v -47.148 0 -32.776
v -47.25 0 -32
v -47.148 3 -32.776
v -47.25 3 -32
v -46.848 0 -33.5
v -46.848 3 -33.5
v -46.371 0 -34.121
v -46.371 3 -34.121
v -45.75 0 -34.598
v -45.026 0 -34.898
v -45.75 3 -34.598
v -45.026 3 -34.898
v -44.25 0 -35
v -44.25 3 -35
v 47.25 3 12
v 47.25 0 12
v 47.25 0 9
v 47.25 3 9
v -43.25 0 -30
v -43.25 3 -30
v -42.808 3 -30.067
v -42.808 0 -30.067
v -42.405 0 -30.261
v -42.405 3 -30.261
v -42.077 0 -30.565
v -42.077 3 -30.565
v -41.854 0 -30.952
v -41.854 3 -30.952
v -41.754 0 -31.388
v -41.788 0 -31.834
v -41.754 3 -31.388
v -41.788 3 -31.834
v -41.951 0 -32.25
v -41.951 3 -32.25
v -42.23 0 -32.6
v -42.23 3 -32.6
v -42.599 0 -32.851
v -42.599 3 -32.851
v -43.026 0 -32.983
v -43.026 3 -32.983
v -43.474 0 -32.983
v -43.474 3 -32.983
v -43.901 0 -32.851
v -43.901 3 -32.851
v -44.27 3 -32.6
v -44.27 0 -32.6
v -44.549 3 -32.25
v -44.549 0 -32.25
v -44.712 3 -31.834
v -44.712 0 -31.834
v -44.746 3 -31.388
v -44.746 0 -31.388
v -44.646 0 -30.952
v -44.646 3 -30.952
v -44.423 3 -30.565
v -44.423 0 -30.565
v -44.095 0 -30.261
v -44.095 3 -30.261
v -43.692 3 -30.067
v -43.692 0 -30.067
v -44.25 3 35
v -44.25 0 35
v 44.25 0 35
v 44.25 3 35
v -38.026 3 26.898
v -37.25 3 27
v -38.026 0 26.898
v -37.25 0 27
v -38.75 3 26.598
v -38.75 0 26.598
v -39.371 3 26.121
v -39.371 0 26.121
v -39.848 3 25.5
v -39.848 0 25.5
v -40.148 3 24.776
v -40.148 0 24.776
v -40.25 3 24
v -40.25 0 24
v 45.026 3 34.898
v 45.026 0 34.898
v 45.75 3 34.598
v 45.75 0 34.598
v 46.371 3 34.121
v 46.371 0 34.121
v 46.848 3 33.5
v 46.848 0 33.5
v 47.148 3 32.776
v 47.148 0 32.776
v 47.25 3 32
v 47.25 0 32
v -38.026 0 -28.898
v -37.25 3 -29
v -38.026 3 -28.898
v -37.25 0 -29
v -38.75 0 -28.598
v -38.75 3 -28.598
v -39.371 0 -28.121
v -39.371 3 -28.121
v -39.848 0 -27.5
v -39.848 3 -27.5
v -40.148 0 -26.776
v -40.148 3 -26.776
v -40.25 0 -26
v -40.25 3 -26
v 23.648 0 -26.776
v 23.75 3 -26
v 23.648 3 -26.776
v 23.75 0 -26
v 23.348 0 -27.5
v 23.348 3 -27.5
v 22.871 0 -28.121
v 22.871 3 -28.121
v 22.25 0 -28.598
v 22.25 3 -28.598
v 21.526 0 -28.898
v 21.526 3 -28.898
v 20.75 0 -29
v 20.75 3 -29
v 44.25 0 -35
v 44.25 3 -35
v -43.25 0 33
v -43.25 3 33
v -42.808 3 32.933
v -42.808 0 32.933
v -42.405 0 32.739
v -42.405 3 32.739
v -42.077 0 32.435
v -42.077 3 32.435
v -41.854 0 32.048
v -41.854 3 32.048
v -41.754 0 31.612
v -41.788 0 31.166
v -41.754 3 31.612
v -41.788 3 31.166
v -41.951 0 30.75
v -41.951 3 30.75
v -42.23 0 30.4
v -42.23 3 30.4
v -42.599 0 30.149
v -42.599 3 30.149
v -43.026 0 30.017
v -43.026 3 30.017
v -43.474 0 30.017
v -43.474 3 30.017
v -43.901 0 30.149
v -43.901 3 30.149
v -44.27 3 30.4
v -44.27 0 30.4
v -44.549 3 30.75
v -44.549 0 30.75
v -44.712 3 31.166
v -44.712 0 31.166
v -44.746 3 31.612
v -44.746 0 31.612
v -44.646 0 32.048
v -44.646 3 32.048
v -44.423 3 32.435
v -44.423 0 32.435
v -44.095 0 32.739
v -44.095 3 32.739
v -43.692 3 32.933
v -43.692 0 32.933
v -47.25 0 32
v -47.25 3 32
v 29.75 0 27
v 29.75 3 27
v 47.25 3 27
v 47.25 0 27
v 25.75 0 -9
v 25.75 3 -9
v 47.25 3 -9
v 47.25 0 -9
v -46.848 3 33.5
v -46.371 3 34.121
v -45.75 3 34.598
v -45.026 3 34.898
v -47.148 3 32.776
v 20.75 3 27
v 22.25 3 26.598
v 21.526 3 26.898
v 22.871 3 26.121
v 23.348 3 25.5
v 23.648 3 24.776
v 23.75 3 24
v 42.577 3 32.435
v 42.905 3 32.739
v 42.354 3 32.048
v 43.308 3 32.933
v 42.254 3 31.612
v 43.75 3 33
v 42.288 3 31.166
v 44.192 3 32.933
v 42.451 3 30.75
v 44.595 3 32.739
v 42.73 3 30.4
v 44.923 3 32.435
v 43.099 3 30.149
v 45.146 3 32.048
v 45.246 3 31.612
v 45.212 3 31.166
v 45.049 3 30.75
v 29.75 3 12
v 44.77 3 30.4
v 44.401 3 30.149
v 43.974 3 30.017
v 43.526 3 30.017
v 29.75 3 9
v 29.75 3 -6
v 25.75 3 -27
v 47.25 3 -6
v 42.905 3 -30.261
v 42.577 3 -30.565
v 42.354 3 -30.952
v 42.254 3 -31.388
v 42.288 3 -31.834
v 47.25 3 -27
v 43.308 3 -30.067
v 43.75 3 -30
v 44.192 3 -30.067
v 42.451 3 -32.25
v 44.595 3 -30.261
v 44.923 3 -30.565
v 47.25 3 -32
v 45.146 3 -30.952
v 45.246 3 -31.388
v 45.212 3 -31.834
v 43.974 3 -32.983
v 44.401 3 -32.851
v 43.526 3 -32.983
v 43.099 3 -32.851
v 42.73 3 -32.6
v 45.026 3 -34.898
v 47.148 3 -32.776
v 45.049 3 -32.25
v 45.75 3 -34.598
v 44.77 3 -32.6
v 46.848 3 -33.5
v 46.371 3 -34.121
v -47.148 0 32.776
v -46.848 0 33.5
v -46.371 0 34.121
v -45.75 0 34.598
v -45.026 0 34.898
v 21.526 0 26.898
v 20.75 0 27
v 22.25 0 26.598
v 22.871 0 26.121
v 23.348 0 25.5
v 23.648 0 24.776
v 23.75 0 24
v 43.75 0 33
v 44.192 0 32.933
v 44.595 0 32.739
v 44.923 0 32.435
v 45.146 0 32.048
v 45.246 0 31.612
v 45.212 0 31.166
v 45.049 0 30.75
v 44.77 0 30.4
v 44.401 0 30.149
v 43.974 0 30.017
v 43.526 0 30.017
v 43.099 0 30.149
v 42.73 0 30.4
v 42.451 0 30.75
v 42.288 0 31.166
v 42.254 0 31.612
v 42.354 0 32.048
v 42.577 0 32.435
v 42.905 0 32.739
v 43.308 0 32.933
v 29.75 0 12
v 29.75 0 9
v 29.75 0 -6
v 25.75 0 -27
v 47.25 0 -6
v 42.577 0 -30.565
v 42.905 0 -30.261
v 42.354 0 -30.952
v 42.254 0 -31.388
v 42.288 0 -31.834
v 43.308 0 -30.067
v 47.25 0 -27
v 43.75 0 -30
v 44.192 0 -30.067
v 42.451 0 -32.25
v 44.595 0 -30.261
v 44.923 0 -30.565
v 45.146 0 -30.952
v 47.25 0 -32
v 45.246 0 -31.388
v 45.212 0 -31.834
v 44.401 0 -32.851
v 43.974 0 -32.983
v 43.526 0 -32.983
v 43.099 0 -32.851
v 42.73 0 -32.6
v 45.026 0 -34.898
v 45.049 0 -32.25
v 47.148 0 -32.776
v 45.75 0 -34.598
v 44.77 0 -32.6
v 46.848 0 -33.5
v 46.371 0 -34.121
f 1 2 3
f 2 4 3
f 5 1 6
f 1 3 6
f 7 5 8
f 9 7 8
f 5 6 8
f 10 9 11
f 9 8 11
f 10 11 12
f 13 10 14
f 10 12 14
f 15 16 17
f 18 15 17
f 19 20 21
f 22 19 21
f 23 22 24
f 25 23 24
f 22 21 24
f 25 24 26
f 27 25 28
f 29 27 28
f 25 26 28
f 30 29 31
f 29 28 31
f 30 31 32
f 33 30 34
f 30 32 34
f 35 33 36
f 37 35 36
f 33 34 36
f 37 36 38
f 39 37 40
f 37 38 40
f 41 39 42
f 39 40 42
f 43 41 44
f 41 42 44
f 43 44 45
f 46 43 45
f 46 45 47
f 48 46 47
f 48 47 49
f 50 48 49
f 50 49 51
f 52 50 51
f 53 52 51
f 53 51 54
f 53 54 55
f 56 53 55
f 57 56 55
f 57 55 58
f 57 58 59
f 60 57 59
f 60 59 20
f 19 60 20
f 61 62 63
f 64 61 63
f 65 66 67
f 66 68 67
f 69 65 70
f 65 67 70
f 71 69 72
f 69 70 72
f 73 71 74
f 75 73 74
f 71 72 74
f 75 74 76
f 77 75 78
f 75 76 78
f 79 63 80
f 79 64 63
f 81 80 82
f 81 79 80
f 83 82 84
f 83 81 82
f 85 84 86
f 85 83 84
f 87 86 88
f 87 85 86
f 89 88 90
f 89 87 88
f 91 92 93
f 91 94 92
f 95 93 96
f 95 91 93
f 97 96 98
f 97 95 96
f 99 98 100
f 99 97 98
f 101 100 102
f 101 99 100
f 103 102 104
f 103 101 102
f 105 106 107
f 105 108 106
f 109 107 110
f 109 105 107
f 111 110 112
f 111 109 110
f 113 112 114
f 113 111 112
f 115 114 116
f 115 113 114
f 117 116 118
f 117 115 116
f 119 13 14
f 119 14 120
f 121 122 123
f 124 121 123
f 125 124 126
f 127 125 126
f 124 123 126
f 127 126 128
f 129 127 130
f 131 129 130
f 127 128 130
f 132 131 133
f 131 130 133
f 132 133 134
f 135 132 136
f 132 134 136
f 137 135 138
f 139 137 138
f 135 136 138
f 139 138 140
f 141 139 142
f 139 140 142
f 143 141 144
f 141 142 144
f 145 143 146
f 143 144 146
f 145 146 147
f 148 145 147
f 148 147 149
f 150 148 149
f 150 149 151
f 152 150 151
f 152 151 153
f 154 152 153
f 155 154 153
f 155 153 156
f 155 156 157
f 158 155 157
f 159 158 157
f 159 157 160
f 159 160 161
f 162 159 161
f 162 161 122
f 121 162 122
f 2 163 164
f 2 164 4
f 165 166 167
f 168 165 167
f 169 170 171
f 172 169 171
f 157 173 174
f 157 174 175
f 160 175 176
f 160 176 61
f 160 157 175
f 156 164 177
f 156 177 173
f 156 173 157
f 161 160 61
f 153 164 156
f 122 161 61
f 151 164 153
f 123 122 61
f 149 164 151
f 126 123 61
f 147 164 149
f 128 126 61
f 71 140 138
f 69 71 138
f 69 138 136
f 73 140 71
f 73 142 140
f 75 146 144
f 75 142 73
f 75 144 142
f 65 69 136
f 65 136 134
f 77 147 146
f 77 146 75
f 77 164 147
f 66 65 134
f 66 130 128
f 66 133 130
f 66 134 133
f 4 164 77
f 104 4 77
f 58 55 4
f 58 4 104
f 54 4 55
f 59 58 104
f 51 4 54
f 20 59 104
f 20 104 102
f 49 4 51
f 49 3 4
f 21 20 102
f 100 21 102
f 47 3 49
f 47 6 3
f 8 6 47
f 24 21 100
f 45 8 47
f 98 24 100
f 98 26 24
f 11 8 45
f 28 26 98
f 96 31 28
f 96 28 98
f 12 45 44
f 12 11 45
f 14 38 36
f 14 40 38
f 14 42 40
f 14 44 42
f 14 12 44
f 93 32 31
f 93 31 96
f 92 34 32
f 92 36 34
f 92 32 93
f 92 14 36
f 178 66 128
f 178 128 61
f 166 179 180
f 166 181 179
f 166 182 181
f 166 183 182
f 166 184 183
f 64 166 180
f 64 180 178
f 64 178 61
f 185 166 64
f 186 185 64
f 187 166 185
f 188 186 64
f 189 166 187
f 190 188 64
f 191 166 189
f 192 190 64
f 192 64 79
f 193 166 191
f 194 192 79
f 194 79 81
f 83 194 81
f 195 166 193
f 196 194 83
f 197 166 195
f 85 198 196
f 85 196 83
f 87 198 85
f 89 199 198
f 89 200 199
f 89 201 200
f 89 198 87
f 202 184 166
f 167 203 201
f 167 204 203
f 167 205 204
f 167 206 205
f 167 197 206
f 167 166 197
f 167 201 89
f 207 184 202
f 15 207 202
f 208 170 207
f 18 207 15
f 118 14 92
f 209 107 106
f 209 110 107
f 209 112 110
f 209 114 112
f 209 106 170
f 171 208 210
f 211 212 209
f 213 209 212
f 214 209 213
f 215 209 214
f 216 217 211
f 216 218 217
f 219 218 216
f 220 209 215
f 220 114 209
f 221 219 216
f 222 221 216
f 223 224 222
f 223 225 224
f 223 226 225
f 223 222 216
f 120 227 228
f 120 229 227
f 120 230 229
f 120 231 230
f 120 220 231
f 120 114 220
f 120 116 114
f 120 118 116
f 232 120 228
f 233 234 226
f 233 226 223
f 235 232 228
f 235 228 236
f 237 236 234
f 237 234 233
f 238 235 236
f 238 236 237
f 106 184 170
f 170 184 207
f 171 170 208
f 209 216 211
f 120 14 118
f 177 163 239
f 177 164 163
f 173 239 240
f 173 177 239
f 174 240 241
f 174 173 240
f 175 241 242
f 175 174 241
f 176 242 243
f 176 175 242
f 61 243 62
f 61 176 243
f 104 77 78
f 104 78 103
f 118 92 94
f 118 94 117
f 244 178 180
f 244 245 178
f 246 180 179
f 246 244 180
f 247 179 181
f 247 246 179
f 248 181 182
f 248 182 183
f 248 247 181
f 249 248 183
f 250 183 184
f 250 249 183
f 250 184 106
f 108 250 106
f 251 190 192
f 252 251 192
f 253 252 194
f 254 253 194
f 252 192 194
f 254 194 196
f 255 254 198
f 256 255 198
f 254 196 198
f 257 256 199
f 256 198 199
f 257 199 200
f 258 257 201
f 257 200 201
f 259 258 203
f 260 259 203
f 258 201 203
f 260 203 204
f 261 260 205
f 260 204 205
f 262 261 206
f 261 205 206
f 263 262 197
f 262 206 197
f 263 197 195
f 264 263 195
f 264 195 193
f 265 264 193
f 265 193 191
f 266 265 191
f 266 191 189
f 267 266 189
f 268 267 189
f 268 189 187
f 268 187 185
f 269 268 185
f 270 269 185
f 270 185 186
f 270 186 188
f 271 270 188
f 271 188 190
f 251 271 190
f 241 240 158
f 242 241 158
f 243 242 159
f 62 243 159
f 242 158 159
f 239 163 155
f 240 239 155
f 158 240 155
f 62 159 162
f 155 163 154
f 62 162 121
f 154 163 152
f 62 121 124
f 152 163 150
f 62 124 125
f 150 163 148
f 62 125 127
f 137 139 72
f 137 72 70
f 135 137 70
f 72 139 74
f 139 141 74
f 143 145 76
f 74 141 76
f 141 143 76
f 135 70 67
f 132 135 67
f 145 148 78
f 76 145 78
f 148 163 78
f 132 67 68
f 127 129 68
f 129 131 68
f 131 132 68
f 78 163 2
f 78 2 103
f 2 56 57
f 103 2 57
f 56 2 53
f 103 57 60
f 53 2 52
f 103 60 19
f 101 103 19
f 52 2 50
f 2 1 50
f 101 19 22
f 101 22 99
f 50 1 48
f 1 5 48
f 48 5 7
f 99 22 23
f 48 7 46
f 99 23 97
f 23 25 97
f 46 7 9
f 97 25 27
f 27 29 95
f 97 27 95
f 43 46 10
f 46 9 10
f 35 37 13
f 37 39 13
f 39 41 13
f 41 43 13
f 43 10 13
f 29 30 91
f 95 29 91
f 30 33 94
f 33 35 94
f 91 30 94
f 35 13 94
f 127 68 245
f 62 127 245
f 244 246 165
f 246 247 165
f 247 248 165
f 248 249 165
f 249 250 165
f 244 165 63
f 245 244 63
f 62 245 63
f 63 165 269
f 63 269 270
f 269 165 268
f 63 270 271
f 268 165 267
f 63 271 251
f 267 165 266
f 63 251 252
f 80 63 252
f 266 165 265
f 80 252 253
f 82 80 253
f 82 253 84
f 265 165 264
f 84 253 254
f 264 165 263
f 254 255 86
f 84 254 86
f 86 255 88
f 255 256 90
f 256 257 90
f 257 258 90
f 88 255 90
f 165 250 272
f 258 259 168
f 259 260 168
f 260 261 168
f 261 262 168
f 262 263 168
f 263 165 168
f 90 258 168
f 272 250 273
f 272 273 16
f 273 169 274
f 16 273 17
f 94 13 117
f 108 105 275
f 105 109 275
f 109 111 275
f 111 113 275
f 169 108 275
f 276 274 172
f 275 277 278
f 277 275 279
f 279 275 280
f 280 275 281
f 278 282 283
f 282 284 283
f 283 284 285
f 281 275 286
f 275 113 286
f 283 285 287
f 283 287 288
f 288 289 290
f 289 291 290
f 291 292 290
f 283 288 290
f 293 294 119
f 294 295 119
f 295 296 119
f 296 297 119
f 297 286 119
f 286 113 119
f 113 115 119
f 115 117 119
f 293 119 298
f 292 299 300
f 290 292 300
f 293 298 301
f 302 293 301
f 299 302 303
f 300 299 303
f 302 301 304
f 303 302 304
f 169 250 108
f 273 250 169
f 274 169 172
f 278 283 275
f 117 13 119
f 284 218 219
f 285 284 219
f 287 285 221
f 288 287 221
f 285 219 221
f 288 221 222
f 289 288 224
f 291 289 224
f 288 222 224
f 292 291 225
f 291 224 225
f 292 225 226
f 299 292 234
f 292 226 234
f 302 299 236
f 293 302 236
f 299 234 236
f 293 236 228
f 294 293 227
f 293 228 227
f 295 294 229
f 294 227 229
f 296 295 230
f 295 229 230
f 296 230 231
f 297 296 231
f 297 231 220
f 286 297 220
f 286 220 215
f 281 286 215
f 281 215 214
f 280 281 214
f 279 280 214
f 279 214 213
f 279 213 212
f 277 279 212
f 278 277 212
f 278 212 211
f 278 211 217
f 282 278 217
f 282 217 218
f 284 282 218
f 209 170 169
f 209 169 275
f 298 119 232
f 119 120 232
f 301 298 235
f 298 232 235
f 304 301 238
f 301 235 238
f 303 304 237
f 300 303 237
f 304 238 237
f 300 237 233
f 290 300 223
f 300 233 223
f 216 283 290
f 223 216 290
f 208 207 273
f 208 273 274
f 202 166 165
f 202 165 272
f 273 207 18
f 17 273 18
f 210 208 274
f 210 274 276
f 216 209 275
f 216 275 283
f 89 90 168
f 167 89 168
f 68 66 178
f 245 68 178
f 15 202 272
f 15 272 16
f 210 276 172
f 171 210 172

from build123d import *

# Parameters (mm, degrees)
SKETCH1_W           = 94.5
SKETCH1_H           = 70
BOSS_EXTRUDE1_DEPTH = 3
SKETCH3_R           = 1.5
CUT_EXTRUDE2_DEPTH  = 59.877521177
FILLET2_R           = 3
SKETCH5_W           = 64
SKETCH5_H           = 56
SKETCH5_W_2         = 21.5
SKETCH5_H_2         = 18
SKETCH5_W_3         = 17.5
SKETCH5_H_3         = 15
CUT_EXTRUDE3_DEPTH  = 59.877521177
FILLET3_R           = 3


with BuildPart() as part:
    # Sketch1 → Boss-Extrude1 (new body)
    with BuildSketch(Plane(origin=(0, 0, 0), x_dir=(1, 0, 0), z_dir=(0, 1, 0))):
        Rectangle(SKETCH1_W, SKETCH1_H)
    extrude(amount=BOSS_EXTRUDE1_DEPTH)

    # Sketch3 → Cut-Extrude2 (cut, through all)
    with BuildSketch(Plane(origin=(0, 3, 0), x_dir=(1, 0, 0), z_dir=(0, 1, 0))):
        with Locations(Location((43.75, 31.5, 0), (0, 0, 270))):
            Circle(SKETCH3_R)
        with Locations(Location((-43.25, 31.5, 0), (0, 0, 270))):
            Circle(SKETCH3_R)
        with Locations(Location((-43.25, -31.5, 0), (0, 0, 270))):
            Circle(SKETCH3_R)
        with Locations(Location((43.75, -31.5, 0), (0, 0, 270))):
            Circle(SKETCH3_R)
    extrude(amount=-CUT_EXTRUDE2_DEPTH, mode=Mode.SUBTRACT)

    # Fillet2
    fillet2_edges = [part.edges().sort_by_distance(p)[0] for p in [
        (47.25, 1.5, 35),
        (-47.25, 1.5, 35),
        (-47.25, 1.5, -35),
        (47.25, 1.5, -35),
    ]]
    fillet(fillet2_edges, radius=FILLET2_R)

    # Sketch5 → Cut-Extrude3 (cut, through all)
    with BuildSketch(Plane(origin=(0, 3, 0), x_dir=(1, 0, 0), z_dir=(0, 1, 0))):
        with Locations((-8.25, 1)):
            Rectangle(SKETCH5_W, SKETCH5_H)
        with Locations((36.5, 18)):
            Rectangle(SKETCH5_W_2, SKETCH5_H_2)
        with Locations((38.5, -1.5)):
            Rectangle(SKETCH5_W_3, SKETCH5_H_3)
        with Locations((38.5, -19.5)):
            Rectangle(SKETCH5_W_3, SKETCH5_H_3)
    extrude(amount=-CUT_EXTRUDE3_DEPTH, mode=Mode.SUBTRACT)

    # Fillet3
    fillet3_edges = [part.edges().sort_by_distance(p)[0] for p in [
        (-40.25, 1.5, 27),
        (-40.25, 1.5, -29),
        (23.75, 1.5, -29),
        (23.75, 1.5, 27),
    ]]
    fillet(fillet3_edges, radius=FILLET3_R)


solid = part.part
